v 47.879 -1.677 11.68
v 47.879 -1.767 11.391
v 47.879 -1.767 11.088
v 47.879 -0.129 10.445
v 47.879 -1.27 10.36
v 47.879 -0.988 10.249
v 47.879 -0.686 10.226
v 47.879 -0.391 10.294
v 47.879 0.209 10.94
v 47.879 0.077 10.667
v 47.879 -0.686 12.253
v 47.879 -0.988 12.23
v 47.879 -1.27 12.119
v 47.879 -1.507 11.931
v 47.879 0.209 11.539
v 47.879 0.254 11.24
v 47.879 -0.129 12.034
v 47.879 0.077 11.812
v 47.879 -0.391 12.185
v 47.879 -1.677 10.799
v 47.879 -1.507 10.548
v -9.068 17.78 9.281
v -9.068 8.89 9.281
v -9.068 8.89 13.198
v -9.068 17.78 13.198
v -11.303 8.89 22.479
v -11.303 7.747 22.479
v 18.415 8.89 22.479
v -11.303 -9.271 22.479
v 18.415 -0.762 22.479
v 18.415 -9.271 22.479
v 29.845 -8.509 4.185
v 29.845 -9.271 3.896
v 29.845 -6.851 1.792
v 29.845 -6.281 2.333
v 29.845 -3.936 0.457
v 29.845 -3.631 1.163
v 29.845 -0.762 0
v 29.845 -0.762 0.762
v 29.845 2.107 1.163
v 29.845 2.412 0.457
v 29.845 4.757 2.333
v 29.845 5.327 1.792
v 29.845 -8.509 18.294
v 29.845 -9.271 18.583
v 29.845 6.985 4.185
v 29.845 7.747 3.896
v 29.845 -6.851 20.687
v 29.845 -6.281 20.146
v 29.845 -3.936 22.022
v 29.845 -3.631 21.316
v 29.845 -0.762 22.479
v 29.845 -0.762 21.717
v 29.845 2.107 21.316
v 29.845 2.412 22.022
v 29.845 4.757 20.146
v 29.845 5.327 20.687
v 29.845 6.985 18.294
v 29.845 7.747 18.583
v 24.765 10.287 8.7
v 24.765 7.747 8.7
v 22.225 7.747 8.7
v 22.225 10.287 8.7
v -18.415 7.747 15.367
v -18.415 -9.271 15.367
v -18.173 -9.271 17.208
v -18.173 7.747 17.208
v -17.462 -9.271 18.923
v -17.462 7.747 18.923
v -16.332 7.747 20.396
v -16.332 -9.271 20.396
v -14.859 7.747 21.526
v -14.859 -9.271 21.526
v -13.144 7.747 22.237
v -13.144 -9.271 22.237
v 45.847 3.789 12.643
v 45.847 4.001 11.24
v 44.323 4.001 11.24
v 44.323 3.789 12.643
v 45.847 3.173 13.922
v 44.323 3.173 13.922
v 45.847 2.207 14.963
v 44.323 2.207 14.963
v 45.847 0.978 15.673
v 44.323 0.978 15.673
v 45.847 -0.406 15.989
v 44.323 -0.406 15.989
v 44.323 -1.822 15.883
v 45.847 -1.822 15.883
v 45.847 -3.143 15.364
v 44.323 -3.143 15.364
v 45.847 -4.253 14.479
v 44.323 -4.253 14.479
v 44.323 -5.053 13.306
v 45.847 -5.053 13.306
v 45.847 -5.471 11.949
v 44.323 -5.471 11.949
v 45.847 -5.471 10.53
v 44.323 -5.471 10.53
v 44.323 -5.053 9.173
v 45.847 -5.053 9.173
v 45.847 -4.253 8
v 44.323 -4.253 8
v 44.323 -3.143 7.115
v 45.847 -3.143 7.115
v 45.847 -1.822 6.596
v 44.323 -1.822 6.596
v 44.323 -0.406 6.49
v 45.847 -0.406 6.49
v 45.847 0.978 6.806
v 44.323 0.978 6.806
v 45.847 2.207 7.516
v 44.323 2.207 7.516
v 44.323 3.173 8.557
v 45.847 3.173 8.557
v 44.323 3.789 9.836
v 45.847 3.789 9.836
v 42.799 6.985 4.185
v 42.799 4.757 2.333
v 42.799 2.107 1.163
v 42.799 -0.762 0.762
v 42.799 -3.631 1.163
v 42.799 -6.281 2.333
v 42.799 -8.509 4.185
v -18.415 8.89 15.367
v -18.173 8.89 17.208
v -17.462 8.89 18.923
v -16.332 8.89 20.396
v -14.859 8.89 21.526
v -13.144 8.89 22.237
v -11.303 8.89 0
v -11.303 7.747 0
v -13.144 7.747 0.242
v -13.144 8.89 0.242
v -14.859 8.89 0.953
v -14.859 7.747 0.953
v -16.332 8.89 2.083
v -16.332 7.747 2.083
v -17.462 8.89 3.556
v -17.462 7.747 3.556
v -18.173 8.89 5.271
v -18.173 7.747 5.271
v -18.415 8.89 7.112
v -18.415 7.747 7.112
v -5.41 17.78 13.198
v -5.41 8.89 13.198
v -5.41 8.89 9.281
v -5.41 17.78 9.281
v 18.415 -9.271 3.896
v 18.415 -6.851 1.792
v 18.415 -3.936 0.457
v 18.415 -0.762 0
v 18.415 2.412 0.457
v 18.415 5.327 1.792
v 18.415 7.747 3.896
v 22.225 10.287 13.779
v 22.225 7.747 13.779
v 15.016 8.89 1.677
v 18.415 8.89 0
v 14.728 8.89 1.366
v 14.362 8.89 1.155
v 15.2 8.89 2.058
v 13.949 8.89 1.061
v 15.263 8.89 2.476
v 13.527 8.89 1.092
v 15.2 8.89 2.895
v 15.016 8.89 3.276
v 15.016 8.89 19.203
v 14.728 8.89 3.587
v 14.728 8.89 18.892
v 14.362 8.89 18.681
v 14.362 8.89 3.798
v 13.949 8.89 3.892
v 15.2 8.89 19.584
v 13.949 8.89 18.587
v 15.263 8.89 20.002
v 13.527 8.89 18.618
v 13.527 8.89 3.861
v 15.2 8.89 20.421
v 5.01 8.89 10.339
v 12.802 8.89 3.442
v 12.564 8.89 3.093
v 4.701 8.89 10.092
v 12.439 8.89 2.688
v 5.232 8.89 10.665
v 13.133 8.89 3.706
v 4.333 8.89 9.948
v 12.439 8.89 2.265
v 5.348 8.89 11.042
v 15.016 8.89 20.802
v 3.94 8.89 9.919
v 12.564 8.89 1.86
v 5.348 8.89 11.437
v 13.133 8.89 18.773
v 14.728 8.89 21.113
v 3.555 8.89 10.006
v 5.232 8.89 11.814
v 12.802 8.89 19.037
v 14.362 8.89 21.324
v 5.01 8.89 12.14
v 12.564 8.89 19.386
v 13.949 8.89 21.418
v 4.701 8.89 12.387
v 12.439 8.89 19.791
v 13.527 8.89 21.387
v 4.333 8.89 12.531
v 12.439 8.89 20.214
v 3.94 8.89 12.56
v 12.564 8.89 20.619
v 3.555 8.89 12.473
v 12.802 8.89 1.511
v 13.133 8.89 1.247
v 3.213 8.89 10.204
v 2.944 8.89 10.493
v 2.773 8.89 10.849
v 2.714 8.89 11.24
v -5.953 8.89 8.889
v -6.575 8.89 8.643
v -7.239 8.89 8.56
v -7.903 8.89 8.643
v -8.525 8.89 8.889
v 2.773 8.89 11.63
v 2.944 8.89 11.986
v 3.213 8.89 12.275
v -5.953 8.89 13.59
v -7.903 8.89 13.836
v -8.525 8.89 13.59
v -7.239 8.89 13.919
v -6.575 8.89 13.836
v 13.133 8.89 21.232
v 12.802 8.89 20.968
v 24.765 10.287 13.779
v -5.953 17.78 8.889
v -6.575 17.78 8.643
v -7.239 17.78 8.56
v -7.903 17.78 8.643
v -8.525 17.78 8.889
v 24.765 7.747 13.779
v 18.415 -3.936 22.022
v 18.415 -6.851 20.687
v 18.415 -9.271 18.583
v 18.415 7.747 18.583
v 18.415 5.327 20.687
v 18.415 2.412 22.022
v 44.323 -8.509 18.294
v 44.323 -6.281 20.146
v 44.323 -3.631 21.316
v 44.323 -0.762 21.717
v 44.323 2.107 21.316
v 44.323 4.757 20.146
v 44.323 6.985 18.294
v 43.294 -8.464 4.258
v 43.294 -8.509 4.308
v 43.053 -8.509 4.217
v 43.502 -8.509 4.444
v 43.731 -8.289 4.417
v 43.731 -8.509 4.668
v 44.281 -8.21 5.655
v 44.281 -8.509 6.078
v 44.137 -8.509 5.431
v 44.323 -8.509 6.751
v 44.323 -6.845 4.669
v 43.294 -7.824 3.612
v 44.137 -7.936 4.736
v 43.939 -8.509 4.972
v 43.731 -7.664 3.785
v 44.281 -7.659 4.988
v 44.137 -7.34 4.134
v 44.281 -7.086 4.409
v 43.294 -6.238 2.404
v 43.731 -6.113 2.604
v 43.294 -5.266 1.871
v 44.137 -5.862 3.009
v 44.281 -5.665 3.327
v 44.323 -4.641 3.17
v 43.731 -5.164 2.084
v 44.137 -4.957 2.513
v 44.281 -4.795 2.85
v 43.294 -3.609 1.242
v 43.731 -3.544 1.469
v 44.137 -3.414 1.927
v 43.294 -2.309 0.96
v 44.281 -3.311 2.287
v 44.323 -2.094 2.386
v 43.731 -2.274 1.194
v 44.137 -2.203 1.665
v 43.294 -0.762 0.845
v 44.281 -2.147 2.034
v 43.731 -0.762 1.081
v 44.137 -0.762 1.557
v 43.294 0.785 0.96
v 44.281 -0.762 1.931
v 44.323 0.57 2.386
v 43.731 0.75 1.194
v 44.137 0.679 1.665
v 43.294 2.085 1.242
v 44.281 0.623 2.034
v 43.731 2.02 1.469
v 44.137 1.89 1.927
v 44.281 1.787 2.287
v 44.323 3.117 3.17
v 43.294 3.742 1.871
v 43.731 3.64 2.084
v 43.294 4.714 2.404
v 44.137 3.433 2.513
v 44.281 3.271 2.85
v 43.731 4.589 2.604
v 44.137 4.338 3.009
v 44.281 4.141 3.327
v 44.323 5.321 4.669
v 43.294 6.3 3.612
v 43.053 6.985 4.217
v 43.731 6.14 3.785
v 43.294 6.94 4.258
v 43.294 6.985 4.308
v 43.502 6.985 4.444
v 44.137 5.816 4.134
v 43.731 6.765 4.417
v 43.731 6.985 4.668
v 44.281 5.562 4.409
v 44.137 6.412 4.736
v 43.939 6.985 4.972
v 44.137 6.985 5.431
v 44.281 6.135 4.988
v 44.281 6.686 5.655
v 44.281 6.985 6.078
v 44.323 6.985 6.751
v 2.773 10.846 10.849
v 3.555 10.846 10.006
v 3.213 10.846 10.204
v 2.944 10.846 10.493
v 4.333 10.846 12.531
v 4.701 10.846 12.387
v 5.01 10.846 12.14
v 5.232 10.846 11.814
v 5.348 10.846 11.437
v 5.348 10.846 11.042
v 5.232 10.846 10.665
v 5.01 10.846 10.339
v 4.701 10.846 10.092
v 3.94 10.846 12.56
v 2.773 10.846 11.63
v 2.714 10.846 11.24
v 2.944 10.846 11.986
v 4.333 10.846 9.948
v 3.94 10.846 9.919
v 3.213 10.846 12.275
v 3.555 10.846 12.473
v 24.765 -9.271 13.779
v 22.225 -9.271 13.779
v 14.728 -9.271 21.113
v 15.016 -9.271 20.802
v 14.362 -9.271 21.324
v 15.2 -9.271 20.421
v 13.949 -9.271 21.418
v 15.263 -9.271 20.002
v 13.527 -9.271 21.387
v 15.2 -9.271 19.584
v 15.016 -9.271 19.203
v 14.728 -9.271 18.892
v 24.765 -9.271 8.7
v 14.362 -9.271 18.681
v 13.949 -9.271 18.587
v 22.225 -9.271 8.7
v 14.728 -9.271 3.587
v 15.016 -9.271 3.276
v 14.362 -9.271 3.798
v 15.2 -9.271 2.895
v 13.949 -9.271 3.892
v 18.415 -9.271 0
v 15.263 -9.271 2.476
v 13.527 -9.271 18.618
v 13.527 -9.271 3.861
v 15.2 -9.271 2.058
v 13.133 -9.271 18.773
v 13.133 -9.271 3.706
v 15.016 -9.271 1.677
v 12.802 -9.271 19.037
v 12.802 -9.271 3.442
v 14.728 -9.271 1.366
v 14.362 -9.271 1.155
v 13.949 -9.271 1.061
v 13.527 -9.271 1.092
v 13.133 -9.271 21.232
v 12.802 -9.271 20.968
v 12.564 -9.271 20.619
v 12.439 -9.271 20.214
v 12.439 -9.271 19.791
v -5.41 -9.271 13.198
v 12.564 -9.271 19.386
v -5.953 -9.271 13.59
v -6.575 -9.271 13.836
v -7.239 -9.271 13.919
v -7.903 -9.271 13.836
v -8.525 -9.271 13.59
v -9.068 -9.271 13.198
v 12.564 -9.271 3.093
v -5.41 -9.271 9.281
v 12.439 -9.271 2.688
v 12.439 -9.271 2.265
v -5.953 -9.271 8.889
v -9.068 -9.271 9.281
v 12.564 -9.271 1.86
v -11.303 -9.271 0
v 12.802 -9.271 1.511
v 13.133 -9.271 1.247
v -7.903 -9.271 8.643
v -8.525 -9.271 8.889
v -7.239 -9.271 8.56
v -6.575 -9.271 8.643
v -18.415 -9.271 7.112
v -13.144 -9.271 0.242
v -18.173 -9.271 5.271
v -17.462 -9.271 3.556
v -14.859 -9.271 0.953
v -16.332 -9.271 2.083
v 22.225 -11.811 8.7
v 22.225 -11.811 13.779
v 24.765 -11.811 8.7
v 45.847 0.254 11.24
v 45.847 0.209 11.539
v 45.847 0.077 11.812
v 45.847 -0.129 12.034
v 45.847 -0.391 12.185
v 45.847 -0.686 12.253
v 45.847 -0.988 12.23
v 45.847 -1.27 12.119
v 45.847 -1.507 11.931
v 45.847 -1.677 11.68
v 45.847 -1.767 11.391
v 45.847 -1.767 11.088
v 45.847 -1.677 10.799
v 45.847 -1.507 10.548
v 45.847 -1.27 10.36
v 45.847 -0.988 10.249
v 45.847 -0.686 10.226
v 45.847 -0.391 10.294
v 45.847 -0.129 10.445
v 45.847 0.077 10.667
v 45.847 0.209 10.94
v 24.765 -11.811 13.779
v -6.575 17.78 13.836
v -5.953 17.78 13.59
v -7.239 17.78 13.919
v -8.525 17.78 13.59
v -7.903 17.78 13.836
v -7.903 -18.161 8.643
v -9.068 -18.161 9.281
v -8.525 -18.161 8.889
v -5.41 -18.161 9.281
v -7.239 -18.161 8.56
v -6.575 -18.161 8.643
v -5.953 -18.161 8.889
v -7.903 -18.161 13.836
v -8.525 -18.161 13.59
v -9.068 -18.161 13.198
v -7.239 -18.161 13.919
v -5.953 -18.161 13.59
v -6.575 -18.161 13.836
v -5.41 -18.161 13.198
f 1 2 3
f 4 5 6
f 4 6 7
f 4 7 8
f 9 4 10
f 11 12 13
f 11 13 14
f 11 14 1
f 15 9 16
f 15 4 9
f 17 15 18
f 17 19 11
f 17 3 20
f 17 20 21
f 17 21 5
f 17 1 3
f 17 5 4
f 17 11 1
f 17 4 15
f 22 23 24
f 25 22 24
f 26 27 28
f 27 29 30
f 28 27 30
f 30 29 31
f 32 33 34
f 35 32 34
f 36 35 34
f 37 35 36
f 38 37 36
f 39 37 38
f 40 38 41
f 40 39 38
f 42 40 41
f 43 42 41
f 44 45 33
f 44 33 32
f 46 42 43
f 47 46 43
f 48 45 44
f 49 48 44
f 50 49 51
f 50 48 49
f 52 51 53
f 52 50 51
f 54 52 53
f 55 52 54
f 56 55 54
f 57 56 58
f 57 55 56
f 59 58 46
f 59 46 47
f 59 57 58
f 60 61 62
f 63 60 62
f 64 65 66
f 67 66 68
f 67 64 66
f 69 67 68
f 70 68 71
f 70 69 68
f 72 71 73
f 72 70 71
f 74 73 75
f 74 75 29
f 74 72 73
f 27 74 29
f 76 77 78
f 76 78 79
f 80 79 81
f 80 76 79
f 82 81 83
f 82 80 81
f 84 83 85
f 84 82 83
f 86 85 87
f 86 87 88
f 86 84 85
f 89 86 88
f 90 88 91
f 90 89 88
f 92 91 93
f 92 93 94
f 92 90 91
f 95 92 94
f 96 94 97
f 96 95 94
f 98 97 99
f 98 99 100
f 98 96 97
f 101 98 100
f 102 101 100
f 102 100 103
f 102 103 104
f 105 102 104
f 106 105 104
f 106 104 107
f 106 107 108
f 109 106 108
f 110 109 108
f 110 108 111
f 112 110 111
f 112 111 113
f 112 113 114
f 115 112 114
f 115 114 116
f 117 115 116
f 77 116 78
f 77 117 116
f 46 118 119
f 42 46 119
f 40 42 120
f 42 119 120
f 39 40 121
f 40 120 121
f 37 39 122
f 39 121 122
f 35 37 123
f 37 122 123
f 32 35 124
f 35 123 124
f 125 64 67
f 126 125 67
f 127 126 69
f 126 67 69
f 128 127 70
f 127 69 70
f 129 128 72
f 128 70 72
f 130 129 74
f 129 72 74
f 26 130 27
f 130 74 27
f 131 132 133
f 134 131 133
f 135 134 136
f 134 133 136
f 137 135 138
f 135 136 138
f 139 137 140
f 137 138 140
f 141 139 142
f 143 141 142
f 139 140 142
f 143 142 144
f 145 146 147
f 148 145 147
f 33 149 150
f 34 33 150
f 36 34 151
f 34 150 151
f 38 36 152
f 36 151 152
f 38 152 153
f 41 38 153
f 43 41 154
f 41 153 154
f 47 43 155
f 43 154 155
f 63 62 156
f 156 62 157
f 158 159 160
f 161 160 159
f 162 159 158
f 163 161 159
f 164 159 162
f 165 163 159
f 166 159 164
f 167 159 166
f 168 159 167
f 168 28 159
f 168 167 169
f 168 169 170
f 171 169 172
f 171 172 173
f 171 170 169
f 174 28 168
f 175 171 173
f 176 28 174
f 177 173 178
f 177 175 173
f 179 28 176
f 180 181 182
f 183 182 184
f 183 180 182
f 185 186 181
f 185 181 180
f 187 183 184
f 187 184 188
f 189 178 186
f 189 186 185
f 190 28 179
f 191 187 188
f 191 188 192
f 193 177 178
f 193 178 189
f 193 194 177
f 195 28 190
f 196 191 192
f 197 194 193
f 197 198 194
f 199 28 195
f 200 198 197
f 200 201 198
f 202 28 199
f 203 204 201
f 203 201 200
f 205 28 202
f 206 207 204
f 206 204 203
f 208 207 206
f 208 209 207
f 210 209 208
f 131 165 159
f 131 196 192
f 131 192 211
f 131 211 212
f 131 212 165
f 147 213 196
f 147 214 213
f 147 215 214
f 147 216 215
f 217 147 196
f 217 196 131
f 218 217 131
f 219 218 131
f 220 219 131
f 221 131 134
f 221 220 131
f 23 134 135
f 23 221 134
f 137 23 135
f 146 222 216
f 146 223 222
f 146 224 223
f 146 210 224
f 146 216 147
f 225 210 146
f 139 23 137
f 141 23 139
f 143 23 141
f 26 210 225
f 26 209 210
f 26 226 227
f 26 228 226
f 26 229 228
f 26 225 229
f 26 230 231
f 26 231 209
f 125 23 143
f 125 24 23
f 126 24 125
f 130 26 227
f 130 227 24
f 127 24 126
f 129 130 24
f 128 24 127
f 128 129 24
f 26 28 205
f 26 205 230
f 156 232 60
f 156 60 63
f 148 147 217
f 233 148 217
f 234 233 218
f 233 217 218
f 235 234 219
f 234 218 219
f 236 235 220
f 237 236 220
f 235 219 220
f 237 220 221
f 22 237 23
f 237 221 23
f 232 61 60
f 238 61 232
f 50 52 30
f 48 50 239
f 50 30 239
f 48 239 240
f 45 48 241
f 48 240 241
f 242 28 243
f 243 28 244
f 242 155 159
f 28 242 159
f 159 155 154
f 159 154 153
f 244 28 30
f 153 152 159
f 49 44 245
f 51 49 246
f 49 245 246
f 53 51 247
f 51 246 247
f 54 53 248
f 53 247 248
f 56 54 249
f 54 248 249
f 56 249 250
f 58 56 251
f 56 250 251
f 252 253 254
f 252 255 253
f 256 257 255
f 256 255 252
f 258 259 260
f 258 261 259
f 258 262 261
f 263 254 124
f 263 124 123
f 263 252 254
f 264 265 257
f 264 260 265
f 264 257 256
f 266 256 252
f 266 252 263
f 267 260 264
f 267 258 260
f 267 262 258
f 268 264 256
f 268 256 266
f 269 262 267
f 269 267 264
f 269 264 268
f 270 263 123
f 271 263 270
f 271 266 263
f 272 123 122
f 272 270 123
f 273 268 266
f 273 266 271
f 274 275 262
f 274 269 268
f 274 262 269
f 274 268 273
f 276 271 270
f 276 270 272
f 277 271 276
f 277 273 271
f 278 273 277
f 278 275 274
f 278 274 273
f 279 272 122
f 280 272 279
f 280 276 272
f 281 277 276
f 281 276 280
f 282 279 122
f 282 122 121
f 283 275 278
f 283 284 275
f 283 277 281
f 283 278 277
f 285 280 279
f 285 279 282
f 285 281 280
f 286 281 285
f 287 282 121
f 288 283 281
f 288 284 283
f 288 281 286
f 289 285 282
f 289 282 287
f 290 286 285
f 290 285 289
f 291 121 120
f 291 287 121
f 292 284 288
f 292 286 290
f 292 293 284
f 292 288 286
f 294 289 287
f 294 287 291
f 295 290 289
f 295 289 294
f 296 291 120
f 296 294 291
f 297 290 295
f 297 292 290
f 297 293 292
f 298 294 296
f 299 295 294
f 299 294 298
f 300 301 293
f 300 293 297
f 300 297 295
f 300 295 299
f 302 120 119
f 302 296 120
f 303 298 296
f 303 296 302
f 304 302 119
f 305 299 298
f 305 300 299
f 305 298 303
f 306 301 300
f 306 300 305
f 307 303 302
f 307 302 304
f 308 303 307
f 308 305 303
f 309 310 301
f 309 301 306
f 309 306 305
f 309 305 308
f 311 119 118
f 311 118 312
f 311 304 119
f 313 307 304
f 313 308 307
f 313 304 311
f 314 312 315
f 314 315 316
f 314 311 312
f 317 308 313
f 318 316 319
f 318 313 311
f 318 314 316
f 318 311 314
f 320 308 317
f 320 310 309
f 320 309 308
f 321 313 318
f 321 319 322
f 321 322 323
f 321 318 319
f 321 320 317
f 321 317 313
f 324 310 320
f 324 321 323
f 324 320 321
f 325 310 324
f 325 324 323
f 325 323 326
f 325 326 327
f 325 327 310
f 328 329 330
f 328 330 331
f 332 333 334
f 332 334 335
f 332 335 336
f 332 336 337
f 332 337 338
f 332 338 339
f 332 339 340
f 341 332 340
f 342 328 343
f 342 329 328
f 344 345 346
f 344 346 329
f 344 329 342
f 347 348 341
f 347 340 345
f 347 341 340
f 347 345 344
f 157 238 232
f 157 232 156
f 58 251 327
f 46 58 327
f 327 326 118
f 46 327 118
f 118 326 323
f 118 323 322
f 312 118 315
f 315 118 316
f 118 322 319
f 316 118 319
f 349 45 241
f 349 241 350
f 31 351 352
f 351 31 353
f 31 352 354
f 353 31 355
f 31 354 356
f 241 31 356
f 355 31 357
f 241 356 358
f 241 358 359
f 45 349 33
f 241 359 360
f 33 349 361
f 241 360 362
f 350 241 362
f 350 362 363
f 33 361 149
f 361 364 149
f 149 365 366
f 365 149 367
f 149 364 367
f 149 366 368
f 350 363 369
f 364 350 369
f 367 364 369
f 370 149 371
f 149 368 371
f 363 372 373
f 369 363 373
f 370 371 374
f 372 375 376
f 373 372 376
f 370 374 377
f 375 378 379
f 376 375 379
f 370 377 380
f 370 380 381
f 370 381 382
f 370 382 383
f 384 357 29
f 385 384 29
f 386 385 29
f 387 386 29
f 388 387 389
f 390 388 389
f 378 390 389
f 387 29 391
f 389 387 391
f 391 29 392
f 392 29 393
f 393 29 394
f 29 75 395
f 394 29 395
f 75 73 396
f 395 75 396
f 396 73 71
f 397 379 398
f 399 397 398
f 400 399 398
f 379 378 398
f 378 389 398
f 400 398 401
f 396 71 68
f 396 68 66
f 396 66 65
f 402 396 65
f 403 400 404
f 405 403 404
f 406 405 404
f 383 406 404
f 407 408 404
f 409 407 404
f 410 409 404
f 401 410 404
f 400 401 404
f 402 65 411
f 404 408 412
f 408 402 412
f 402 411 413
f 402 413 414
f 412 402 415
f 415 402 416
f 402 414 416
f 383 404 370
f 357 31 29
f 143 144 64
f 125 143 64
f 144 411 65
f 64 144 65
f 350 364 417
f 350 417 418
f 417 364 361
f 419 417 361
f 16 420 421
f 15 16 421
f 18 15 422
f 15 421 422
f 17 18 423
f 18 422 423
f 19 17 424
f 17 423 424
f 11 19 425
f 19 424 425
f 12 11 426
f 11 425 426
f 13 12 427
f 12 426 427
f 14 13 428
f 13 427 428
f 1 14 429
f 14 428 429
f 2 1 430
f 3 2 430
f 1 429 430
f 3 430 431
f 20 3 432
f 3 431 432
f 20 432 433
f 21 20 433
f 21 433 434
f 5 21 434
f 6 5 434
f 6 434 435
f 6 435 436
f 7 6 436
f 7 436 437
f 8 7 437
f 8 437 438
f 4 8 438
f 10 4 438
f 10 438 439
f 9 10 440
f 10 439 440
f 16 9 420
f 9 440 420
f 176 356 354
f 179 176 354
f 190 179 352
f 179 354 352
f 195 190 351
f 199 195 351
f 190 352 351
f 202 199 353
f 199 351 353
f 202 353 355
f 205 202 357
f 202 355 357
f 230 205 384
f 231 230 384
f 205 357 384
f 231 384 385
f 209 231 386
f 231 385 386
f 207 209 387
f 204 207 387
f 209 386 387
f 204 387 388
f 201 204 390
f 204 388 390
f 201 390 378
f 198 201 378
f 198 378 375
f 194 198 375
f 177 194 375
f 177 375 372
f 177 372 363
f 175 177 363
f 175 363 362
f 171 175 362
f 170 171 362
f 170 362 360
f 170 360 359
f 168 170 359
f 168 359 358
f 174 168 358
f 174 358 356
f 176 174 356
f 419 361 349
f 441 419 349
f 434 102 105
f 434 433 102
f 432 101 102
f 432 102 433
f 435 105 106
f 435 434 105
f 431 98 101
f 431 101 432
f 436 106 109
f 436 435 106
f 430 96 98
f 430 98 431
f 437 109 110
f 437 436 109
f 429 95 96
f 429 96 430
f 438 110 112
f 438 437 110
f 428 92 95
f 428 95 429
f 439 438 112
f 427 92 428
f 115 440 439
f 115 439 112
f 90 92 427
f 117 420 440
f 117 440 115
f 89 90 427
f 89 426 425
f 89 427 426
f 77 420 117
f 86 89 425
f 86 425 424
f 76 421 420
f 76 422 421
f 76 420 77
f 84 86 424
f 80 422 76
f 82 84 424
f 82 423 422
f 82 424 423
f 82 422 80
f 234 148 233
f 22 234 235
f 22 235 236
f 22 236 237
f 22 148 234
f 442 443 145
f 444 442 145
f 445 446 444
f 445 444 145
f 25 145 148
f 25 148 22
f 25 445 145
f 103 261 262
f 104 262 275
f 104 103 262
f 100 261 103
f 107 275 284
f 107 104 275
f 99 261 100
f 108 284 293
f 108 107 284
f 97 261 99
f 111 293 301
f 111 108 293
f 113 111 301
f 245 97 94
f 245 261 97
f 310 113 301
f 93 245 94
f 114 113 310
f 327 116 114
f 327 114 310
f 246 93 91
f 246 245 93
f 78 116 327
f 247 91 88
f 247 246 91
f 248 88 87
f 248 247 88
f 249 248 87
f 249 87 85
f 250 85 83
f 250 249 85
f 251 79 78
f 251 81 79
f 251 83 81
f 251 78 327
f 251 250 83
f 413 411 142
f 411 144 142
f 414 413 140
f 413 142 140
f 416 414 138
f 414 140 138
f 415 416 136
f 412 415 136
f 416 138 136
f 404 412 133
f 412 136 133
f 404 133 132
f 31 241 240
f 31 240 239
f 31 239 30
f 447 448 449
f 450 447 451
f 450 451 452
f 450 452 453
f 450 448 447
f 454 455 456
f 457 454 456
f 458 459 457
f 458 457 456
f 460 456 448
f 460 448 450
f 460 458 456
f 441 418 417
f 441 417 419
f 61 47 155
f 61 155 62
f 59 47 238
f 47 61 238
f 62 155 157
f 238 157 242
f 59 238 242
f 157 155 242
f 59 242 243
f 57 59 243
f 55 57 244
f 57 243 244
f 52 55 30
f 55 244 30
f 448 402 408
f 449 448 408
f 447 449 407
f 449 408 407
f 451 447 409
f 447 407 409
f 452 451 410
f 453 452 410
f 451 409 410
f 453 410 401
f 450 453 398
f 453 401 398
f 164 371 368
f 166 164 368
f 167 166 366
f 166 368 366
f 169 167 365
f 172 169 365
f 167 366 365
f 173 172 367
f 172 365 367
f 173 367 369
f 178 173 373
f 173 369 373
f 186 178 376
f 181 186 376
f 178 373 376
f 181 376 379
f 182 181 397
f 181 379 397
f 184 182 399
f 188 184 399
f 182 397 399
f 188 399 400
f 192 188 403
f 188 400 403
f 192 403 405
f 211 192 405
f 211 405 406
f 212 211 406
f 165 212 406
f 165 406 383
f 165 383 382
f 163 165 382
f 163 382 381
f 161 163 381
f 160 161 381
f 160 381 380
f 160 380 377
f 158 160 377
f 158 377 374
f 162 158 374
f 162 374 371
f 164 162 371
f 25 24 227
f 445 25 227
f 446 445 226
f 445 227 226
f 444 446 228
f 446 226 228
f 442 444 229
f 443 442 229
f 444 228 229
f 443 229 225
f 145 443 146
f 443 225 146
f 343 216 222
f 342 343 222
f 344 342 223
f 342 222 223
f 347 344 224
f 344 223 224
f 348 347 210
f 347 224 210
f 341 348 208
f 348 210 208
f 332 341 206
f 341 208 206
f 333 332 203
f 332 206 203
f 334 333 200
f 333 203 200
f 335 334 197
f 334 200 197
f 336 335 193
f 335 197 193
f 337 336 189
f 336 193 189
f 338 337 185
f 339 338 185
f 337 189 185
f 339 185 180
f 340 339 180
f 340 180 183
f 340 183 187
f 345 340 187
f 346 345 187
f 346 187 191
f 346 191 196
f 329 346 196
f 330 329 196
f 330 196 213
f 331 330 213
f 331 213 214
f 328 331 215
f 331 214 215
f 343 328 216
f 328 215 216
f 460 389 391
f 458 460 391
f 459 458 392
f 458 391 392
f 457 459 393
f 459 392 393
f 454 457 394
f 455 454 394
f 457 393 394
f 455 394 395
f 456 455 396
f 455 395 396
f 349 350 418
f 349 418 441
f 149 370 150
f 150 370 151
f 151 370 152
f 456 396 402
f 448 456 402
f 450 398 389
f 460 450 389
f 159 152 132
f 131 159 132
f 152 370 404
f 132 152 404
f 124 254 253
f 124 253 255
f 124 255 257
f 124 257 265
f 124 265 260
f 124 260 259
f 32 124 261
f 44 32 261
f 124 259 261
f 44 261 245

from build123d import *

# Parameters (mm, degrees)
F0_W      = 36.83
F0_H      = 17.018
F1_DEPTH  = 22.479
F2_R      = 7.112
F1_FACE_W = 17.018
F1_FACE_H = 8.255
F4_DEPTH  = 27.432
F6_DEPTH  = 16.002
F7_R      = 12.816169
F7_R_2    = 4.7625
F8_DEPTH  = 1.524
F9_R      = 1.524
F10_R     = 1.016
F11_DEPTH = 2.032
F12_W     = 2.54
F12_H     = 5.08
F13_DEPTH = 2.54
F15_DEPTH = 1.143
F16_W     = 2.54
F16_H     = 5.08
F17_DEPTH = 2.54
F19_DEPTH = 8.89
F21_DEPTH = 8.89
F22_R     = 1.324614
F23_DEPTH = 1.9558
F24_R     = 1.419753
F25_DEPTH = 25.4


with BuildPart() as f1:
    # F0 (on Top) → F1 (new body)
    with BuildSketch(Plane.XY):
        with Locations((0, -0.762)):
            Rectangle(F0_W, F0_H)
    extrude(amount=F1_DEPTH)

    # F2
    f2_edges = [f1.edges().sort_by_distance(p)[0] for p in [
        (-18.415, -0.762, 22.479),
        (-18.415, -0.762, 0),
    ]]
    fillet(f2_edges, radius=F2_R)

    # F3 (on face) + F1_face (on face) → F4 (join)
    with BuildSketch(Plane.YZ.offset(18.415)):
        with BuildLine():
            Line((-9.271, 18.582747), (-9.271, 3.896253))
            ThreePointArc((-9.271, 3.896253), (-5.441313, 1.020381), (-0.762, 0))
            ThreePointArc((-0.762, 0), (3.917313, 1.020381), (7.747, 3.896253))
            Line((7.747, 3.896253), (7.747, 18.582747))
            ThreePointArc((7.747, 18.582747), (3.917313, 21.458619), (-0.762, 22.479))
            ThreePointArc((-0.762, 22.479), (-5.441313, 21.458619), (-9.271, 18.582747))
        make_face()
    with BuildSketch(Plane(origin=(18.415, -0.762, 11.2395), x_dir=(0, 1, 0), z_dir=(1, 0, 0))):
        Rectangle(F1_FACE_W, F1_FACE_H)
    extrude(amount=F4_DEPTH)

    # F5 (on face) → F6 (cut)
    with BuildSketch(Plane.YZ.offset(45.847)):
        with BuildLine():
            ThreePointArc((13.335, 20.428588), (-0.762, 28.067), (-14.859, 20.428588))
            Line((-14.859, 20.428588), (-14.859, 2.050412))
            ThreePointArc((-14.859, 2.050412), (-0.762, -5.588), (13.335, 2.050412))
            Line((13.335, 2.050412), (13.335, 20.428588))
        make_face()
        with BuildLine():
            ThreePointArc((-9.271, 18.582747), (-0.762, 22.479), (7.747, 18.582747))
            Line((7.747, 18.582747), (7.747, 3.896253))
            ThreePointArc((7.747, 3.896253), (-0.762, 0), (-9.271, 3.896253))
            Line((-9.271, 3.896253), (-9.271, 18.582747))
        make_face(mode=Mode.SUBTRACT)
        with BuildLine():
            Line((7.747, 3.896253), (7.747, 18.582747))
            ThreePointArc((7.747, 18.582747), (-0.762, 22.479), (-9.271, 18.582747))
            Line((-9.271, 18.582747), (-9.271, 3.896253))
            ThreePointArc((-9.271, 3.896253), (-0.762, 0), (7.747, 3.896253))
        make_face()
        with BuildLine():
            Line((-8.509, 4.185282), (-8.509, 18.293718))
            ThreePointArc((-8.509, 18.293718), (-0.762, 21.717), (6.985, 18.293718))
            Line((6.985, 18.293718), (6.985, 4.185282))
            ThreePointArc((6.985, 4.185282), (-0.762, 0.762), (-8.509, 4.185282))
        make_face(mode=Mode.SUBTRACT)
    extrude(amount=-F6_DEPTH, mode=Mode.SUBTRACT)

    # F7 (on face) → F8 (cut)
    with BuildSketch(Plane.YZ.offset(45.847)):
        with Locations((-0.762, 11.2395)):
            Circle(F7_R)
        with BuildLine():
            ThreePointArc((6.985, 4.185282), (-0.762, 0.762), (-8.509, 4.185282))
            Line((-8.509, 4.185282), (-8.509, 18.293718))
            ThreePointArc((-8.509, 18.293718), (-0.762, 21.717), (6.985, 18.293718))
            Line((6.985, 18.293718), (6.985, 4.185282))
        make_face(mode=Mode.SUBTRACT)
        with BuildLine():
            Line((-8.509, 18.293718), (-8.509, 4.185282))
            ThreePointArc((-8.509, 4.185282), (-0.762, 0.762), (6.985, 4.185282))
            Line((6.985, 4.185282), (6.985, 18.293718))
            ThreePointArc((6.985, 18.293718), (-0.762, 21.717), (-8.509, 18.293718))
        make_face()
        with Locations((-0.762, 11.2395)):
            Circle(F7_R_2, mode=Mode.SUBTRACT)
    extrude(amount=-F8_DEPTH, mode=Mode.SUBTRACT)

    # F9
    f9_edges = [f1.edges().sort_by_distance(p)[0] for p in [
        (44.323, -0.762, 0.762),
    ]]
    fillet(f9_edges, radius=F9_R)

    # F10 (on face) → F11 (join)
    with BuildSketch(Plane.YZ.offset(45.847)):
        with Locations((-0.762, 11.2395)):
            Circle(F10_R)
    extrude(amount=F11_DEPTH)

    # F12 (on face) → F13 (join)
    with BuildSketch(Plane.XZ.offset(9.271)):
        with Locations((23.495, 11.2395)):
            Rectangle(F12_W, F12_H)
    extrude(amount=F13_DEPTH)

    # F14 (on face) → F15 (join)
    with BuildSketch(Plane(origin=(0, 7.747, 0), x_dir=(-1, 0, 0), z_dir=(0, 1, 0))):
        with BuildLine():
            Line((-18.415, 0), (11.303, 0))
            ThreePointArc((11.303, 0), (16.331943, 2.083057), (18.415, 7.112))
            Line((18.415, 7.112), (18.415, 15.367))
            ThreePointArc((18.415, 15.367), (16.331943, 20.395943), (11.303, 22.479))
            Line((11.303, 22.479), (-18.415, 22.479))
            Line((-18.415, 22.479), (-18.415, 18.582747))
            Line((-18.415, 18.582747), (-18.415, 3.896253))
            Line((-18.415, 3.896253), (-18.415, 0))
        make_face()
    extrude(amount=F15_DEPTH)

    # F16 (on face) → F17 (join)
    with BuildSketch(Plane(origin=(0, 7.747, 0), x_dir=(-1, 0, 0), z_dir=(0, 1, 0))):
        with Locations((-23.495, 11.2395)):
            Rectangle(F16_W, F16_H)
    extrude(amount=F17_DEPTH)

    # F18 (on face) → F19 (join)
    with BuildSketch(Plane.XZ.offset(9.271)):
        with BuildLine():
            Line((-5.4102, 9.280857), (-5.4102, 13.198143))
            ThreePointArc((-5.4102, 13.198143), (-7.239, 13.9192), (-9.0678, 13.198143))
            Line((-9.0678, 13.198143), (-9.0678, 9.280857))
            ThreePointArc((-9.0678, 9.280857), (-7.239, 8.5598), (-5.4102, 9.280857))
        make_face()
    extrude(amount=F19_DEPTH)

    # F20 (on face) → F21 (join)
    with BuildSketch(Plane(origin=(0, 8.89, 0), x_dir=(-1, 0, 0), z_dir=(0, 1, 0))):
        with BuildLine():
            Line((5.4102, 13.198143), (5.4102, 9.280857))
            ThreePointArc((5.4102, 9.280857), (7.239, 8.5598), (9.0678, 9.280857))
            Line((9.0678, 9.280857), (9.0678, 13.198143))
            ThreePointArc((9.0678, 13.198143), (7.239, 13.9192), (5.4102, 13.198143))
        make_face()
    extrude(amount=F21_DEPTH)

    # F22 (on face) → F23 (join)
    with BuildSketch(Plane(origin=(0, 8.89, 0), x_dir=(-1, 0, 0), z_dir=(0, 1, 0))):
        with Locations((-4.0386, 11.2395)):
            Circle(F22_R)
    extrude(amount=F23_DEPTH)

    # F24 (on face) → F25 (cut)
    with BuildSketch(Plane.XZ.offset(9.271)):
        with Locations((13.843, 20.0025)):
            Circle(F24_R)
        with Locations((13.843, 2.4765)):
            Circle(F24_R)
    extrude(amount=-F25_DEPTH, mode=Mode.SUBTRACT)


solid = f1.part
